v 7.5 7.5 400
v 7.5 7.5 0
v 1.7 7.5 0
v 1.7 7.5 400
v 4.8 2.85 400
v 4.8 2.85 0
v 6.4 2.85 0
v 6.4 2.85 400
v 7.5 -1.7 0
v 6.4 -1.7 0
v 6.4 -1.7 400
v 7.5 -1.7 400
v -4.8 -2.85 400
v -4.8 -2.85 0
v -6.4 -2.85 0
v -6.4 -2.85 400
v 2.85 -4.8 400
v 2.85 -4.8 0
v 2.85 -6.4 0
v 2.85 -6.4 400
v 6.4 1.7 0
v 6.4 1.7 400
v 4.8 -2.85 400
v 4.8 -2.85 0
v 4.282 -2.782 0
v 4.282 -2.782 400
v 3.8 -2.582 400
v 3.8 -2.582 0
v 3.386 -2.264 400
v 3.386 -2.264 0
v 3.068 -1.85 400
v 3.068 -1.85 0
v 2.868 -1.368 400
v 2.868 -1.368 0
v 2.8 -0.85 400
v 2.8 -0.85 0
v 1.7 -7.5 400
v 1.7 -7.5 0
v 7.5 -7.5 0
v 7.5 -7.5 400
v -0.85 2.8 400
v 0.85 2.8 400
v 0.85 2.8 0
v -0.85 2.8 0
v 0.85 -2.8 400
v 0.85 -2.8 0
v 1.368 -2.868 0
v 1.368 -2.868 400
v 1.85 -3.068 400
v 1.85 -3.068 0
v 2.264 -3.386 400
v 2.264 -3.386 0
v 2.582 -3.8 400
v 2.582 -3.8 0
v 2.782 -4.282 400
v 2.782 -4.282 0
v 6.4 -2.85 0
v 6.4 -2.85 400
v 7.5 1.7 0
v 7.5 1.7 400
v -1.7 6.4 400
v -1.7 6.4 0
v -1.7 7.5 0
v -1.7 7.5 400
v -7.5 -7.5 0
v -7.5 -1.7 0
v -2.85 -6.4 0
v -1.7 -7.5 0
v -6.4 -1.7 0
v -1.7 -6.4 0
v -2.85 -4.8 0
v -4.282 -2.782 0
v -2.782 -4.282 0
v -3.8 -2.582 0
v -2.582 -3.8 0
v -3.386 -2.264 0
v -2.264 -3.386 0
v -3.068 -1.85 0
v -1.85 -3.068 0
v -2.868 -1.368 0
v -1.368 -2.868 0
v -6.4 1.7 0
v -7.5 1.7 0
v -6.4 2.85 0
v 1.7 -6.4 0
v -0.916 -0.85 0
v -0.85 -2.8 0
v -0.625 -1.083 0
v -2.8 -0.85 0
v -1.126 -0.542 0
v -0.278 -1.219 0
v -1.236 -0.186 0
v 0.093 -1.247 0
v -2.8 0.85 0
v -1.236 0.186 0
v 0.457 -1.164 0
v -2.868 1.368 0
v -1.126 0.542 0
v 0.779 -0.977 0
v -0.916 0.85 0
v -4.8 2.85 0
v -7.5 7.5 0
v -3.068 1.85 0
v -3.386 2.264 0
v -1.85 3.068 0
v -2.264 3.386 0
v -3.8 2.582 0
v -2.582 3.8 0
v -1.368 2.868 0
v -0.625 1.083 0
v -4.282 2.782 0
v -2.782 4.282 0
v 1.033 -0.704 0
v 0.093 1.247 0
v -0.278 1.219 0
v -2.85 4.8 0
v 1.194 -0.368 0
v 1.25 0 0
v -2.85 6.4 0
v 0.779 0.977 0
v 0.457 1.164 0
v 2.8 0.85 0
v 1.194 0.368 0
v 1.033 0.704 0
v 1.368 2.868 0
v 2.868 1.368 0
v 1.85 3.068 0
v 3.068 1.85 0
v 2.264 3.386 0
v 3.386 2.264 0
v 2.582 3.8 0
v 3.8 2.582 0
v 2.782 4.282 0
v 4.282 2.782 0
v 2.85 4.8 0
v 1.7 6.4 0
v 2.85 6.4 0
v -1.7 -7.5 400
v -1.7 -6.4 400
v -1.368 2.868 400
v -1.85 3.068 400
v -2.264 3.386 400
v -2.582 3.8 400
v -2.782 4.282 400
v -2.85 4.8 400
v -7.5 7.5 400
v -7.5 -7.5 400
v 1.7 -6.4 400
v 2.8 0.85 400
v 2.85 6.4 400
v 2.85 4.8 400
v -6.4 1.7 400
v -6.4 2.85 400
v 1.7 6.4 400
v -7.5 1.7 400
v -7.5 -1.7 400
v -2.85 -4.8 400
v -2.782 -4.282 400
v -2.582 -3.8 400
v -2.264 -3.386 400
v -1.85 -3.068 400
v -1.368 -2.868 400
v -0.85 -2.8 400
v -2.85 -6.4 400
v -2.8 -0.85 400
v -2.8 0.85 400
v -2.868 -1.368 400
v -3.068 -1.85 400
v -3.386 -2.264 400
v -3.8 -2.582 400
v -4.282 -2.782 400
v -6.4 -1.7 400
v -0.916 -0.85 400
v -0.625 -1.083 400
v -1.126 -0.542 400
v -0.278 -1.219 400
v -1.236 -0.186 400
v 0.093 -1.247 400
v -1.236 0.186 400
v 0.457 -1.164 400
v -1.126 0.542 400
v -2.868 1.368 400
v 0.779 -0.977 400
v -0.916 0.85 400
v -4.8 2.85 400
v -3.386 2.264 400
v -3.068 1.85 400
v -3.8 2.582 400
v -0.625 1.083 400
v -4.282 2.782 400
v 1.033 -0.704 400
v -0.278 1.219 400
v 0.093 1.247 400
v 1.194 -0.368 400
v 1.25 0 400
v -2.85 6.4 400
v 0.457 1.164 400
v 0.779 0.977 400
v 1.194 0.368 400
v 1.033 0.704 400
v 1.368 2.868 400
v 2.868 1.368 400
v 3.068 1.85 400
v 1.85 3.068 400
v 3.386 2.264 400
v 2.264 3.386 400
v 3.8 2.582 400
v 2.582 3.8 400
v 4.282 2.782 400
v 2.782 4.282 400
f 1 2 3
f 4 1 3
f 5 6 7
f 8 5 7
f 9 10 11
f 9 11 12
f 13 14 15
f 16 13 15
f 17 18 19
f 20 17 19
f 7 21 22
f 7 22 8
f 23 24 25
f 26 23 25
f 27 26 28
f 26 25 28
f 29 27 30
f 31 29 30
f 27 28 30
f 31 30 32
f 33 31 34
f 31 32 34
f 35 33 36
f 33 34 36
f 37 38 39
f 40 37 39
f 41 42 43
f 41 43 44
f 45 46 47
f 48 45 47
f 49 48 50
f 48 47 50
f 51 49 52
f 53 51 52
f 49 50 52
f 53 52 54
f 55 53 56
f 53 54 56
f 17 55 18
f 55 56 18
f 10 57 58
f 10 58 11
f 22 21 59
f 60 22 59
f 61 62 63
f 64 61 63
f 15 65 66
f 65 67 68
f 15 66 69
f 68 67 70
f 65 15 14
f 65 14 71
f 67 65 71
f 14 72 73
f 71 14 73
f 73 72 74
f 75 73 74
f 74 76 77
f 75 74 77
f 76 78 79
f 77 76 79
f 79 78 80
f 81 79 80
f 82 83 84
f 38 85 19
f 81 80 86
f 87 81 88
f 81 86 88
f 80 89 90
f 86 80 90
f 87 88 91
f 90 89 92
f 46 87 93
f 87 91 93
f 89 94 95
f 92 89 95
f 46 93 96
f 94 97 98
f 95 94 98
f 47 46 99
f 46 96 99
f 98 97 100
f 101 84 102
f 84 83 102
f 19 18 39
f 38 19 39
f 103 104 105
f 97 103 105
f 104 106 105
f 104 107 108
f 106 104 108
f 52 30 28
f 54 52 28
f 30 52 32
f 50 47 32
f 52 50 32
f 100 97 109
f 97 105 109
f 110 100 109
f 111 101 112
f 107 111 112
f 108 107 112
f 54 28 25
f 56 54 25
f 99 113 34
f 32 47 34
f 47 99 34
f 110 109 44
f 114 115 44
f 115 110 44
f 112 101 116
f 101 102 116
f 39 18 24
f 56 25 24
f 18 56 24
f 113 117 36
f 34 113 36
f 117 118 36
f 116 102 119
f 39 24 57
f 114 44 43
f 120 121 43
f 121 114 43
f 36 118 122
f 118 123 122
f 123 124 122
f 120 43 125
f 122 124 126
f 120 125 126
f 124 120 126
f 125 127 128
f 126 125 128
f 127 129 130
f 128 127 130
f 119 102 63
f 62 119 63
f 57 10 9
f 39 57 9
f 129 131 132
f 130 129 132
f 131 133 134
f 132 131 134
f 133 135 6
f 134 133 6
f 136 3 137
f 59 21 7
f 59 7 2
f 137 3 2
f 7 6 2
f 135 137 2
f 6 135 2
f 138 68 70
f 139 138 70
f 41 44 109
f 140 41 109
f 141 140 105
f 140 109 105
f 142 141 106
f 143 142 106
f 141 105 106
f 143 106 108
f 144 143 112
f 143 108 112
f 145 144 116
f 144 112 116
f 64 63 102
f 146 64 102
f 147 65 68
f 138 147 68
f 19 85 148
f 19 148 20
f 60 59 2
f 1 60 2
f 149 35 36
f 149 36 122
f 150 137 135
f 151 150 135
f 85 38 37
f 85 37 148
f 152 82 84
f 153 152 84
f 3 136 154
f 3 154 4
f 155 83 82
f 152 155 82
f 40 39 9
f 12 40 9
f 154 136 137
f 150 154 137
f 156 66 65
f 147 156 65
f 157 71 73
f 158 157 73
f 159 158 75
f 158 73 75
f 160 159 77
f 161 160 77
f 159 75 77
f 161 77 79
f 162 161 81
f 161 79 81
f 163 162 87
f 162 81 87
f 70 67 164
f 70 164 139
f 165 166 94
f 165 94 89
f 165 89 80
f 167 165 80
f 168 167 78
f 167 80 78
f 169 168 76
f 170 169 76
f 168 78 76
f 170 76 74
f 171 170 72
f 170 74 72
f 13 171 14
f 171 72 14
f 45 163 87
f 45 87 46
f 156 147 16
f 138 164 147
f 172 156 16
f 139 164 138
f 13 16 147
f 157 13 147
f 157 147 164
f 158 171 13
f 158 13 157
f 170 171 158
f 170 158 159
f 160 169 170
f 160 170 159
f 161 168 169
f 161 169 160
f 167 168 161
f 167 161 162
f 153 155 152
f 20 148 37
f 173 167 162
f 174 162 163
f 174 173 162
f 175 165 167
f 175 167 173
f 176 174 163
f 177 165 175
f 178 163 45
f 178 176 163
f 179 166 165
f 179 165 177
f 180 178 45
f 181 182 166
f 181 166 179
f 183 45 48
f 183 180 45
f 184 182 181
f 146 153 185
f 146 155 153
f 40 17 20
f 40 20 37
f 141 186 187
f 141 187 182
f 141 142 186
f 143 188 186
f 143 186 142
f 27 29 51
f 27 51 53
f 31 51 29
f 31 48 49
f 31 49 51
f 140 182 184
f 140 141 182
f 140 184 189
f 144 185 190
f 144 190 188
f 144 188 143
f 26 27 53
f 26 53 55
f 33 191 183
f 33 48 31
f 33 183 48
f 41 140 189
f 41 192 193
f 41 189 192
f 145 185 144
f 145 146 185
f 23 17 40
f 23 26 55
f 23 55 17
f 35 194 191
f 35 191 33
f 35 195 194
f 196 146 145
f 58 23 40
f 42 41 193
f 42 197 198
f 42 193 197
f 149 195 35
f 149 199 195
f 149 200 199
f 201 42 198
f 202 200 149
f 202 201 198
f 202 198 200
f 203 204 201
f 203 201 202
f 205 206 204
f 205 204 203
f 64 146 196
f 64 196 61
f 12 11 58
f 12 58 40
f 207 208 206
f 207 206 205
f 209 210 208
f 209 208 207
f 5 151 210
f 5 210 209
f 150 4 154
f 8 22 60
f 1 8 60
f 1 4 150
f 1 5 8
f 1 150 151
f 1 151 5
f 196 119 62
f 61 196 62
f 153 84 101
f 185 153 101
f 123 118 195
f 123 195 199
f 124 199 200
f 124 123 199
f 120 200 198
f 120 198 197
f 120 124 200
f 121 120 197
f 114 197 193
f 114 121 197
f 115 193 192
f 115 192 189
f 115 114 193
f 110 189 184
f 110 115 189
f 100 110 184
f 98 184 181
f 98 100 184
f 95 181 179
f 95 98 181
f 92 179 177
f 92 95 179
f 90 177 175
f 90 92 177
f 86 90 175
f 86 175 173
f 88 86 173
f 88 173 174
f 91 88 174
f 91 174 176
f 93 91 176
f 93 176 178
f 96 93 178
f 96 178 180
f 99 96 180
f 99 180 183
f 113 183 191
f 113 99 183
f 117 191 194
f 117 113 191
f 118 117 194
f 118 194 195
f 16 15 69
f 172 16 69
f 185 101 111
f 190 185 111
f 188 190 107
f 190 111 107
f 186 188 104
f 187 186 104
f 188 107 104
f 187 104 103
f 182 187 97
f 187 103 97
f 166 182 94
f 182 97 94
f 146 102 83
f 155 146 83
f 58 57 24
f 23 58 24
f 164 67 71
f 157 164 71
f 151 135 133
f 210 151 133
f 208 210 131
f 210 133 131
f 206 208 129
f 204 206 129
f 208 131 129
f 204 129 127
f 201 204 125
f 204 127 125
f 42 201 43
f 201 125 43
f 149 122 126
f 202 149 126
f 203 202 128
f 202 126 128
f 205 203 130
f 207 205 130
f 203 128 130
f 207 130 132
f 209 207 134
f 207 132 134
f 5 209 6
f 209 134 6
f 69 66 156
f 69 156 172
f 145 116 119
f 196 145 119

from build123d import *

# Parameters (mm, degrees)
F0_R     = 1.25
F0_W     = 1.1
F0_H     = 1.15
F0_W_2   = 1.15
F0_H_2   = 1.1
F1_DEPTH = 400


with BuildPart() as f1:
    # F0 (on Top) → F1 (new body)
    with BuildSketch(Plane.XY):
        with BuildLine():
            Line((-2.85, 7.5), (-7.5, 7.5))
            Line((-7.5, 7.5), (-7.5, 2.85))
            Line((-7.5, 2.85), (-6.4, 2.85))
            Line((-6.4, 2.85), (-4.8, 2.85))
            ThreePointArc((-4.8, 2.85), (-3.385786, 2.264214), (-2.8, 0.85))
            Line((-2.8, 0.85), (-2.8, -0.85))
            ThreePointArc((-2.8, -0.85), (-3.385786, -2.264214), (-4.8, -2.85))
            Line((-4.8, -2.85), (-6.4, -2.85))
            Line((-6.4, -2.85), (-7.5, -2.85))
            Line((-7.5, -2.85), (-7.5, -7.5))
            Line((-7.5, -7.5), (-2.85, -7.5))
            Line((-2.85, -7.5), (-2.85, -6.4))
            Line((-2.85, -6.4), (-2.85, -4.8))
            ThreePointArc((-2.85, -4.8), (-2.264214, -3.385786), (-0.85, -2.8))
            Line((-0.85, -2.8), (0.85, -2.8))
            ThreePointArc((0.85, -2.8), (2.264214, -3.385786), (2.85, -4.8))
            Line((2.85, -4.8), (2.85, -6.4))
            Line((2.85, -6.4), (2.85, -7.5))
            Line((2.85, -7.5), (7.5, -7.5))
            Line((7.5, -7.5), (7.5, -2.85))
            Line((7.5, -2.85), (6.4, -2.85))
            Line((6.4, -2.85), (4.8, -2.85))
            ThreePointArc((4.8, -2.85), (3.385786, -2.264214), (2.8, -0.85))
            Line((2.8, -0.85), (2.8, 0.85))
            ThreePointArc((2.8, 0.85), (3.385786, 2.264214), (4.8, 2.85))
            Line((4.8, 2.85), (6.4, 2.85))
            Line((6.4, 2.85), (7.5, 2.85))
            Line((7.5, 2.85), (7.5, 7.5))
            Line((7.5, 7.5), (2.85, 7.5))
            Line((2.85, 7.5), (2.85, 6.4))
            Line((2.85, 6.4), (2.85, 4.8))
            ThreePointArc((2.85, 4.8), (2.264214, 3.385786), (0.85, 2.8))
            Line((0.85, 2.8), (-0.85, 2.8))
            ThreePointArc((-0.85, 2.8), (-2.264214, 3.385786), (-2.85, 4.8))
            Line((-2.85, 4.8), (-2.85, 6.4))
            Line((-2.85, 6.4), (-2.85, 7.5))
        make_face()
        Circle(F0_R, mode=Mode.SUBTRACT)
        with Locations((-6.95, 2.275)):
            Rectangle(F0_W, F0_H)
        with Locations((-6.95, -2.275)):
            Rectangle(F0_W, F0_H)
        with Locations((-2.275, 6.95)):
            Rectangle(F0_W_2, F0_H_2)
        with Locations((2.275, 6.95)):
            Rectangle(F0_W_2, F0_H_2)
        with Locations((6.95, 2.275)):
            Rectangle(F0_W, F0_H)
        with Locations((6.95, -2.275)):
            Rectangle(F0_W, F0_H)
        with Locations((-2.275, -6.95)):
            Rectangle(F0_W_2, F0_H_2)
        with Locations((2.275, -6.95)):
            Rectangle(F0_W_2, F0_H_2)
    extrude(amount=F1_DEPTH)


solid = f1.part
